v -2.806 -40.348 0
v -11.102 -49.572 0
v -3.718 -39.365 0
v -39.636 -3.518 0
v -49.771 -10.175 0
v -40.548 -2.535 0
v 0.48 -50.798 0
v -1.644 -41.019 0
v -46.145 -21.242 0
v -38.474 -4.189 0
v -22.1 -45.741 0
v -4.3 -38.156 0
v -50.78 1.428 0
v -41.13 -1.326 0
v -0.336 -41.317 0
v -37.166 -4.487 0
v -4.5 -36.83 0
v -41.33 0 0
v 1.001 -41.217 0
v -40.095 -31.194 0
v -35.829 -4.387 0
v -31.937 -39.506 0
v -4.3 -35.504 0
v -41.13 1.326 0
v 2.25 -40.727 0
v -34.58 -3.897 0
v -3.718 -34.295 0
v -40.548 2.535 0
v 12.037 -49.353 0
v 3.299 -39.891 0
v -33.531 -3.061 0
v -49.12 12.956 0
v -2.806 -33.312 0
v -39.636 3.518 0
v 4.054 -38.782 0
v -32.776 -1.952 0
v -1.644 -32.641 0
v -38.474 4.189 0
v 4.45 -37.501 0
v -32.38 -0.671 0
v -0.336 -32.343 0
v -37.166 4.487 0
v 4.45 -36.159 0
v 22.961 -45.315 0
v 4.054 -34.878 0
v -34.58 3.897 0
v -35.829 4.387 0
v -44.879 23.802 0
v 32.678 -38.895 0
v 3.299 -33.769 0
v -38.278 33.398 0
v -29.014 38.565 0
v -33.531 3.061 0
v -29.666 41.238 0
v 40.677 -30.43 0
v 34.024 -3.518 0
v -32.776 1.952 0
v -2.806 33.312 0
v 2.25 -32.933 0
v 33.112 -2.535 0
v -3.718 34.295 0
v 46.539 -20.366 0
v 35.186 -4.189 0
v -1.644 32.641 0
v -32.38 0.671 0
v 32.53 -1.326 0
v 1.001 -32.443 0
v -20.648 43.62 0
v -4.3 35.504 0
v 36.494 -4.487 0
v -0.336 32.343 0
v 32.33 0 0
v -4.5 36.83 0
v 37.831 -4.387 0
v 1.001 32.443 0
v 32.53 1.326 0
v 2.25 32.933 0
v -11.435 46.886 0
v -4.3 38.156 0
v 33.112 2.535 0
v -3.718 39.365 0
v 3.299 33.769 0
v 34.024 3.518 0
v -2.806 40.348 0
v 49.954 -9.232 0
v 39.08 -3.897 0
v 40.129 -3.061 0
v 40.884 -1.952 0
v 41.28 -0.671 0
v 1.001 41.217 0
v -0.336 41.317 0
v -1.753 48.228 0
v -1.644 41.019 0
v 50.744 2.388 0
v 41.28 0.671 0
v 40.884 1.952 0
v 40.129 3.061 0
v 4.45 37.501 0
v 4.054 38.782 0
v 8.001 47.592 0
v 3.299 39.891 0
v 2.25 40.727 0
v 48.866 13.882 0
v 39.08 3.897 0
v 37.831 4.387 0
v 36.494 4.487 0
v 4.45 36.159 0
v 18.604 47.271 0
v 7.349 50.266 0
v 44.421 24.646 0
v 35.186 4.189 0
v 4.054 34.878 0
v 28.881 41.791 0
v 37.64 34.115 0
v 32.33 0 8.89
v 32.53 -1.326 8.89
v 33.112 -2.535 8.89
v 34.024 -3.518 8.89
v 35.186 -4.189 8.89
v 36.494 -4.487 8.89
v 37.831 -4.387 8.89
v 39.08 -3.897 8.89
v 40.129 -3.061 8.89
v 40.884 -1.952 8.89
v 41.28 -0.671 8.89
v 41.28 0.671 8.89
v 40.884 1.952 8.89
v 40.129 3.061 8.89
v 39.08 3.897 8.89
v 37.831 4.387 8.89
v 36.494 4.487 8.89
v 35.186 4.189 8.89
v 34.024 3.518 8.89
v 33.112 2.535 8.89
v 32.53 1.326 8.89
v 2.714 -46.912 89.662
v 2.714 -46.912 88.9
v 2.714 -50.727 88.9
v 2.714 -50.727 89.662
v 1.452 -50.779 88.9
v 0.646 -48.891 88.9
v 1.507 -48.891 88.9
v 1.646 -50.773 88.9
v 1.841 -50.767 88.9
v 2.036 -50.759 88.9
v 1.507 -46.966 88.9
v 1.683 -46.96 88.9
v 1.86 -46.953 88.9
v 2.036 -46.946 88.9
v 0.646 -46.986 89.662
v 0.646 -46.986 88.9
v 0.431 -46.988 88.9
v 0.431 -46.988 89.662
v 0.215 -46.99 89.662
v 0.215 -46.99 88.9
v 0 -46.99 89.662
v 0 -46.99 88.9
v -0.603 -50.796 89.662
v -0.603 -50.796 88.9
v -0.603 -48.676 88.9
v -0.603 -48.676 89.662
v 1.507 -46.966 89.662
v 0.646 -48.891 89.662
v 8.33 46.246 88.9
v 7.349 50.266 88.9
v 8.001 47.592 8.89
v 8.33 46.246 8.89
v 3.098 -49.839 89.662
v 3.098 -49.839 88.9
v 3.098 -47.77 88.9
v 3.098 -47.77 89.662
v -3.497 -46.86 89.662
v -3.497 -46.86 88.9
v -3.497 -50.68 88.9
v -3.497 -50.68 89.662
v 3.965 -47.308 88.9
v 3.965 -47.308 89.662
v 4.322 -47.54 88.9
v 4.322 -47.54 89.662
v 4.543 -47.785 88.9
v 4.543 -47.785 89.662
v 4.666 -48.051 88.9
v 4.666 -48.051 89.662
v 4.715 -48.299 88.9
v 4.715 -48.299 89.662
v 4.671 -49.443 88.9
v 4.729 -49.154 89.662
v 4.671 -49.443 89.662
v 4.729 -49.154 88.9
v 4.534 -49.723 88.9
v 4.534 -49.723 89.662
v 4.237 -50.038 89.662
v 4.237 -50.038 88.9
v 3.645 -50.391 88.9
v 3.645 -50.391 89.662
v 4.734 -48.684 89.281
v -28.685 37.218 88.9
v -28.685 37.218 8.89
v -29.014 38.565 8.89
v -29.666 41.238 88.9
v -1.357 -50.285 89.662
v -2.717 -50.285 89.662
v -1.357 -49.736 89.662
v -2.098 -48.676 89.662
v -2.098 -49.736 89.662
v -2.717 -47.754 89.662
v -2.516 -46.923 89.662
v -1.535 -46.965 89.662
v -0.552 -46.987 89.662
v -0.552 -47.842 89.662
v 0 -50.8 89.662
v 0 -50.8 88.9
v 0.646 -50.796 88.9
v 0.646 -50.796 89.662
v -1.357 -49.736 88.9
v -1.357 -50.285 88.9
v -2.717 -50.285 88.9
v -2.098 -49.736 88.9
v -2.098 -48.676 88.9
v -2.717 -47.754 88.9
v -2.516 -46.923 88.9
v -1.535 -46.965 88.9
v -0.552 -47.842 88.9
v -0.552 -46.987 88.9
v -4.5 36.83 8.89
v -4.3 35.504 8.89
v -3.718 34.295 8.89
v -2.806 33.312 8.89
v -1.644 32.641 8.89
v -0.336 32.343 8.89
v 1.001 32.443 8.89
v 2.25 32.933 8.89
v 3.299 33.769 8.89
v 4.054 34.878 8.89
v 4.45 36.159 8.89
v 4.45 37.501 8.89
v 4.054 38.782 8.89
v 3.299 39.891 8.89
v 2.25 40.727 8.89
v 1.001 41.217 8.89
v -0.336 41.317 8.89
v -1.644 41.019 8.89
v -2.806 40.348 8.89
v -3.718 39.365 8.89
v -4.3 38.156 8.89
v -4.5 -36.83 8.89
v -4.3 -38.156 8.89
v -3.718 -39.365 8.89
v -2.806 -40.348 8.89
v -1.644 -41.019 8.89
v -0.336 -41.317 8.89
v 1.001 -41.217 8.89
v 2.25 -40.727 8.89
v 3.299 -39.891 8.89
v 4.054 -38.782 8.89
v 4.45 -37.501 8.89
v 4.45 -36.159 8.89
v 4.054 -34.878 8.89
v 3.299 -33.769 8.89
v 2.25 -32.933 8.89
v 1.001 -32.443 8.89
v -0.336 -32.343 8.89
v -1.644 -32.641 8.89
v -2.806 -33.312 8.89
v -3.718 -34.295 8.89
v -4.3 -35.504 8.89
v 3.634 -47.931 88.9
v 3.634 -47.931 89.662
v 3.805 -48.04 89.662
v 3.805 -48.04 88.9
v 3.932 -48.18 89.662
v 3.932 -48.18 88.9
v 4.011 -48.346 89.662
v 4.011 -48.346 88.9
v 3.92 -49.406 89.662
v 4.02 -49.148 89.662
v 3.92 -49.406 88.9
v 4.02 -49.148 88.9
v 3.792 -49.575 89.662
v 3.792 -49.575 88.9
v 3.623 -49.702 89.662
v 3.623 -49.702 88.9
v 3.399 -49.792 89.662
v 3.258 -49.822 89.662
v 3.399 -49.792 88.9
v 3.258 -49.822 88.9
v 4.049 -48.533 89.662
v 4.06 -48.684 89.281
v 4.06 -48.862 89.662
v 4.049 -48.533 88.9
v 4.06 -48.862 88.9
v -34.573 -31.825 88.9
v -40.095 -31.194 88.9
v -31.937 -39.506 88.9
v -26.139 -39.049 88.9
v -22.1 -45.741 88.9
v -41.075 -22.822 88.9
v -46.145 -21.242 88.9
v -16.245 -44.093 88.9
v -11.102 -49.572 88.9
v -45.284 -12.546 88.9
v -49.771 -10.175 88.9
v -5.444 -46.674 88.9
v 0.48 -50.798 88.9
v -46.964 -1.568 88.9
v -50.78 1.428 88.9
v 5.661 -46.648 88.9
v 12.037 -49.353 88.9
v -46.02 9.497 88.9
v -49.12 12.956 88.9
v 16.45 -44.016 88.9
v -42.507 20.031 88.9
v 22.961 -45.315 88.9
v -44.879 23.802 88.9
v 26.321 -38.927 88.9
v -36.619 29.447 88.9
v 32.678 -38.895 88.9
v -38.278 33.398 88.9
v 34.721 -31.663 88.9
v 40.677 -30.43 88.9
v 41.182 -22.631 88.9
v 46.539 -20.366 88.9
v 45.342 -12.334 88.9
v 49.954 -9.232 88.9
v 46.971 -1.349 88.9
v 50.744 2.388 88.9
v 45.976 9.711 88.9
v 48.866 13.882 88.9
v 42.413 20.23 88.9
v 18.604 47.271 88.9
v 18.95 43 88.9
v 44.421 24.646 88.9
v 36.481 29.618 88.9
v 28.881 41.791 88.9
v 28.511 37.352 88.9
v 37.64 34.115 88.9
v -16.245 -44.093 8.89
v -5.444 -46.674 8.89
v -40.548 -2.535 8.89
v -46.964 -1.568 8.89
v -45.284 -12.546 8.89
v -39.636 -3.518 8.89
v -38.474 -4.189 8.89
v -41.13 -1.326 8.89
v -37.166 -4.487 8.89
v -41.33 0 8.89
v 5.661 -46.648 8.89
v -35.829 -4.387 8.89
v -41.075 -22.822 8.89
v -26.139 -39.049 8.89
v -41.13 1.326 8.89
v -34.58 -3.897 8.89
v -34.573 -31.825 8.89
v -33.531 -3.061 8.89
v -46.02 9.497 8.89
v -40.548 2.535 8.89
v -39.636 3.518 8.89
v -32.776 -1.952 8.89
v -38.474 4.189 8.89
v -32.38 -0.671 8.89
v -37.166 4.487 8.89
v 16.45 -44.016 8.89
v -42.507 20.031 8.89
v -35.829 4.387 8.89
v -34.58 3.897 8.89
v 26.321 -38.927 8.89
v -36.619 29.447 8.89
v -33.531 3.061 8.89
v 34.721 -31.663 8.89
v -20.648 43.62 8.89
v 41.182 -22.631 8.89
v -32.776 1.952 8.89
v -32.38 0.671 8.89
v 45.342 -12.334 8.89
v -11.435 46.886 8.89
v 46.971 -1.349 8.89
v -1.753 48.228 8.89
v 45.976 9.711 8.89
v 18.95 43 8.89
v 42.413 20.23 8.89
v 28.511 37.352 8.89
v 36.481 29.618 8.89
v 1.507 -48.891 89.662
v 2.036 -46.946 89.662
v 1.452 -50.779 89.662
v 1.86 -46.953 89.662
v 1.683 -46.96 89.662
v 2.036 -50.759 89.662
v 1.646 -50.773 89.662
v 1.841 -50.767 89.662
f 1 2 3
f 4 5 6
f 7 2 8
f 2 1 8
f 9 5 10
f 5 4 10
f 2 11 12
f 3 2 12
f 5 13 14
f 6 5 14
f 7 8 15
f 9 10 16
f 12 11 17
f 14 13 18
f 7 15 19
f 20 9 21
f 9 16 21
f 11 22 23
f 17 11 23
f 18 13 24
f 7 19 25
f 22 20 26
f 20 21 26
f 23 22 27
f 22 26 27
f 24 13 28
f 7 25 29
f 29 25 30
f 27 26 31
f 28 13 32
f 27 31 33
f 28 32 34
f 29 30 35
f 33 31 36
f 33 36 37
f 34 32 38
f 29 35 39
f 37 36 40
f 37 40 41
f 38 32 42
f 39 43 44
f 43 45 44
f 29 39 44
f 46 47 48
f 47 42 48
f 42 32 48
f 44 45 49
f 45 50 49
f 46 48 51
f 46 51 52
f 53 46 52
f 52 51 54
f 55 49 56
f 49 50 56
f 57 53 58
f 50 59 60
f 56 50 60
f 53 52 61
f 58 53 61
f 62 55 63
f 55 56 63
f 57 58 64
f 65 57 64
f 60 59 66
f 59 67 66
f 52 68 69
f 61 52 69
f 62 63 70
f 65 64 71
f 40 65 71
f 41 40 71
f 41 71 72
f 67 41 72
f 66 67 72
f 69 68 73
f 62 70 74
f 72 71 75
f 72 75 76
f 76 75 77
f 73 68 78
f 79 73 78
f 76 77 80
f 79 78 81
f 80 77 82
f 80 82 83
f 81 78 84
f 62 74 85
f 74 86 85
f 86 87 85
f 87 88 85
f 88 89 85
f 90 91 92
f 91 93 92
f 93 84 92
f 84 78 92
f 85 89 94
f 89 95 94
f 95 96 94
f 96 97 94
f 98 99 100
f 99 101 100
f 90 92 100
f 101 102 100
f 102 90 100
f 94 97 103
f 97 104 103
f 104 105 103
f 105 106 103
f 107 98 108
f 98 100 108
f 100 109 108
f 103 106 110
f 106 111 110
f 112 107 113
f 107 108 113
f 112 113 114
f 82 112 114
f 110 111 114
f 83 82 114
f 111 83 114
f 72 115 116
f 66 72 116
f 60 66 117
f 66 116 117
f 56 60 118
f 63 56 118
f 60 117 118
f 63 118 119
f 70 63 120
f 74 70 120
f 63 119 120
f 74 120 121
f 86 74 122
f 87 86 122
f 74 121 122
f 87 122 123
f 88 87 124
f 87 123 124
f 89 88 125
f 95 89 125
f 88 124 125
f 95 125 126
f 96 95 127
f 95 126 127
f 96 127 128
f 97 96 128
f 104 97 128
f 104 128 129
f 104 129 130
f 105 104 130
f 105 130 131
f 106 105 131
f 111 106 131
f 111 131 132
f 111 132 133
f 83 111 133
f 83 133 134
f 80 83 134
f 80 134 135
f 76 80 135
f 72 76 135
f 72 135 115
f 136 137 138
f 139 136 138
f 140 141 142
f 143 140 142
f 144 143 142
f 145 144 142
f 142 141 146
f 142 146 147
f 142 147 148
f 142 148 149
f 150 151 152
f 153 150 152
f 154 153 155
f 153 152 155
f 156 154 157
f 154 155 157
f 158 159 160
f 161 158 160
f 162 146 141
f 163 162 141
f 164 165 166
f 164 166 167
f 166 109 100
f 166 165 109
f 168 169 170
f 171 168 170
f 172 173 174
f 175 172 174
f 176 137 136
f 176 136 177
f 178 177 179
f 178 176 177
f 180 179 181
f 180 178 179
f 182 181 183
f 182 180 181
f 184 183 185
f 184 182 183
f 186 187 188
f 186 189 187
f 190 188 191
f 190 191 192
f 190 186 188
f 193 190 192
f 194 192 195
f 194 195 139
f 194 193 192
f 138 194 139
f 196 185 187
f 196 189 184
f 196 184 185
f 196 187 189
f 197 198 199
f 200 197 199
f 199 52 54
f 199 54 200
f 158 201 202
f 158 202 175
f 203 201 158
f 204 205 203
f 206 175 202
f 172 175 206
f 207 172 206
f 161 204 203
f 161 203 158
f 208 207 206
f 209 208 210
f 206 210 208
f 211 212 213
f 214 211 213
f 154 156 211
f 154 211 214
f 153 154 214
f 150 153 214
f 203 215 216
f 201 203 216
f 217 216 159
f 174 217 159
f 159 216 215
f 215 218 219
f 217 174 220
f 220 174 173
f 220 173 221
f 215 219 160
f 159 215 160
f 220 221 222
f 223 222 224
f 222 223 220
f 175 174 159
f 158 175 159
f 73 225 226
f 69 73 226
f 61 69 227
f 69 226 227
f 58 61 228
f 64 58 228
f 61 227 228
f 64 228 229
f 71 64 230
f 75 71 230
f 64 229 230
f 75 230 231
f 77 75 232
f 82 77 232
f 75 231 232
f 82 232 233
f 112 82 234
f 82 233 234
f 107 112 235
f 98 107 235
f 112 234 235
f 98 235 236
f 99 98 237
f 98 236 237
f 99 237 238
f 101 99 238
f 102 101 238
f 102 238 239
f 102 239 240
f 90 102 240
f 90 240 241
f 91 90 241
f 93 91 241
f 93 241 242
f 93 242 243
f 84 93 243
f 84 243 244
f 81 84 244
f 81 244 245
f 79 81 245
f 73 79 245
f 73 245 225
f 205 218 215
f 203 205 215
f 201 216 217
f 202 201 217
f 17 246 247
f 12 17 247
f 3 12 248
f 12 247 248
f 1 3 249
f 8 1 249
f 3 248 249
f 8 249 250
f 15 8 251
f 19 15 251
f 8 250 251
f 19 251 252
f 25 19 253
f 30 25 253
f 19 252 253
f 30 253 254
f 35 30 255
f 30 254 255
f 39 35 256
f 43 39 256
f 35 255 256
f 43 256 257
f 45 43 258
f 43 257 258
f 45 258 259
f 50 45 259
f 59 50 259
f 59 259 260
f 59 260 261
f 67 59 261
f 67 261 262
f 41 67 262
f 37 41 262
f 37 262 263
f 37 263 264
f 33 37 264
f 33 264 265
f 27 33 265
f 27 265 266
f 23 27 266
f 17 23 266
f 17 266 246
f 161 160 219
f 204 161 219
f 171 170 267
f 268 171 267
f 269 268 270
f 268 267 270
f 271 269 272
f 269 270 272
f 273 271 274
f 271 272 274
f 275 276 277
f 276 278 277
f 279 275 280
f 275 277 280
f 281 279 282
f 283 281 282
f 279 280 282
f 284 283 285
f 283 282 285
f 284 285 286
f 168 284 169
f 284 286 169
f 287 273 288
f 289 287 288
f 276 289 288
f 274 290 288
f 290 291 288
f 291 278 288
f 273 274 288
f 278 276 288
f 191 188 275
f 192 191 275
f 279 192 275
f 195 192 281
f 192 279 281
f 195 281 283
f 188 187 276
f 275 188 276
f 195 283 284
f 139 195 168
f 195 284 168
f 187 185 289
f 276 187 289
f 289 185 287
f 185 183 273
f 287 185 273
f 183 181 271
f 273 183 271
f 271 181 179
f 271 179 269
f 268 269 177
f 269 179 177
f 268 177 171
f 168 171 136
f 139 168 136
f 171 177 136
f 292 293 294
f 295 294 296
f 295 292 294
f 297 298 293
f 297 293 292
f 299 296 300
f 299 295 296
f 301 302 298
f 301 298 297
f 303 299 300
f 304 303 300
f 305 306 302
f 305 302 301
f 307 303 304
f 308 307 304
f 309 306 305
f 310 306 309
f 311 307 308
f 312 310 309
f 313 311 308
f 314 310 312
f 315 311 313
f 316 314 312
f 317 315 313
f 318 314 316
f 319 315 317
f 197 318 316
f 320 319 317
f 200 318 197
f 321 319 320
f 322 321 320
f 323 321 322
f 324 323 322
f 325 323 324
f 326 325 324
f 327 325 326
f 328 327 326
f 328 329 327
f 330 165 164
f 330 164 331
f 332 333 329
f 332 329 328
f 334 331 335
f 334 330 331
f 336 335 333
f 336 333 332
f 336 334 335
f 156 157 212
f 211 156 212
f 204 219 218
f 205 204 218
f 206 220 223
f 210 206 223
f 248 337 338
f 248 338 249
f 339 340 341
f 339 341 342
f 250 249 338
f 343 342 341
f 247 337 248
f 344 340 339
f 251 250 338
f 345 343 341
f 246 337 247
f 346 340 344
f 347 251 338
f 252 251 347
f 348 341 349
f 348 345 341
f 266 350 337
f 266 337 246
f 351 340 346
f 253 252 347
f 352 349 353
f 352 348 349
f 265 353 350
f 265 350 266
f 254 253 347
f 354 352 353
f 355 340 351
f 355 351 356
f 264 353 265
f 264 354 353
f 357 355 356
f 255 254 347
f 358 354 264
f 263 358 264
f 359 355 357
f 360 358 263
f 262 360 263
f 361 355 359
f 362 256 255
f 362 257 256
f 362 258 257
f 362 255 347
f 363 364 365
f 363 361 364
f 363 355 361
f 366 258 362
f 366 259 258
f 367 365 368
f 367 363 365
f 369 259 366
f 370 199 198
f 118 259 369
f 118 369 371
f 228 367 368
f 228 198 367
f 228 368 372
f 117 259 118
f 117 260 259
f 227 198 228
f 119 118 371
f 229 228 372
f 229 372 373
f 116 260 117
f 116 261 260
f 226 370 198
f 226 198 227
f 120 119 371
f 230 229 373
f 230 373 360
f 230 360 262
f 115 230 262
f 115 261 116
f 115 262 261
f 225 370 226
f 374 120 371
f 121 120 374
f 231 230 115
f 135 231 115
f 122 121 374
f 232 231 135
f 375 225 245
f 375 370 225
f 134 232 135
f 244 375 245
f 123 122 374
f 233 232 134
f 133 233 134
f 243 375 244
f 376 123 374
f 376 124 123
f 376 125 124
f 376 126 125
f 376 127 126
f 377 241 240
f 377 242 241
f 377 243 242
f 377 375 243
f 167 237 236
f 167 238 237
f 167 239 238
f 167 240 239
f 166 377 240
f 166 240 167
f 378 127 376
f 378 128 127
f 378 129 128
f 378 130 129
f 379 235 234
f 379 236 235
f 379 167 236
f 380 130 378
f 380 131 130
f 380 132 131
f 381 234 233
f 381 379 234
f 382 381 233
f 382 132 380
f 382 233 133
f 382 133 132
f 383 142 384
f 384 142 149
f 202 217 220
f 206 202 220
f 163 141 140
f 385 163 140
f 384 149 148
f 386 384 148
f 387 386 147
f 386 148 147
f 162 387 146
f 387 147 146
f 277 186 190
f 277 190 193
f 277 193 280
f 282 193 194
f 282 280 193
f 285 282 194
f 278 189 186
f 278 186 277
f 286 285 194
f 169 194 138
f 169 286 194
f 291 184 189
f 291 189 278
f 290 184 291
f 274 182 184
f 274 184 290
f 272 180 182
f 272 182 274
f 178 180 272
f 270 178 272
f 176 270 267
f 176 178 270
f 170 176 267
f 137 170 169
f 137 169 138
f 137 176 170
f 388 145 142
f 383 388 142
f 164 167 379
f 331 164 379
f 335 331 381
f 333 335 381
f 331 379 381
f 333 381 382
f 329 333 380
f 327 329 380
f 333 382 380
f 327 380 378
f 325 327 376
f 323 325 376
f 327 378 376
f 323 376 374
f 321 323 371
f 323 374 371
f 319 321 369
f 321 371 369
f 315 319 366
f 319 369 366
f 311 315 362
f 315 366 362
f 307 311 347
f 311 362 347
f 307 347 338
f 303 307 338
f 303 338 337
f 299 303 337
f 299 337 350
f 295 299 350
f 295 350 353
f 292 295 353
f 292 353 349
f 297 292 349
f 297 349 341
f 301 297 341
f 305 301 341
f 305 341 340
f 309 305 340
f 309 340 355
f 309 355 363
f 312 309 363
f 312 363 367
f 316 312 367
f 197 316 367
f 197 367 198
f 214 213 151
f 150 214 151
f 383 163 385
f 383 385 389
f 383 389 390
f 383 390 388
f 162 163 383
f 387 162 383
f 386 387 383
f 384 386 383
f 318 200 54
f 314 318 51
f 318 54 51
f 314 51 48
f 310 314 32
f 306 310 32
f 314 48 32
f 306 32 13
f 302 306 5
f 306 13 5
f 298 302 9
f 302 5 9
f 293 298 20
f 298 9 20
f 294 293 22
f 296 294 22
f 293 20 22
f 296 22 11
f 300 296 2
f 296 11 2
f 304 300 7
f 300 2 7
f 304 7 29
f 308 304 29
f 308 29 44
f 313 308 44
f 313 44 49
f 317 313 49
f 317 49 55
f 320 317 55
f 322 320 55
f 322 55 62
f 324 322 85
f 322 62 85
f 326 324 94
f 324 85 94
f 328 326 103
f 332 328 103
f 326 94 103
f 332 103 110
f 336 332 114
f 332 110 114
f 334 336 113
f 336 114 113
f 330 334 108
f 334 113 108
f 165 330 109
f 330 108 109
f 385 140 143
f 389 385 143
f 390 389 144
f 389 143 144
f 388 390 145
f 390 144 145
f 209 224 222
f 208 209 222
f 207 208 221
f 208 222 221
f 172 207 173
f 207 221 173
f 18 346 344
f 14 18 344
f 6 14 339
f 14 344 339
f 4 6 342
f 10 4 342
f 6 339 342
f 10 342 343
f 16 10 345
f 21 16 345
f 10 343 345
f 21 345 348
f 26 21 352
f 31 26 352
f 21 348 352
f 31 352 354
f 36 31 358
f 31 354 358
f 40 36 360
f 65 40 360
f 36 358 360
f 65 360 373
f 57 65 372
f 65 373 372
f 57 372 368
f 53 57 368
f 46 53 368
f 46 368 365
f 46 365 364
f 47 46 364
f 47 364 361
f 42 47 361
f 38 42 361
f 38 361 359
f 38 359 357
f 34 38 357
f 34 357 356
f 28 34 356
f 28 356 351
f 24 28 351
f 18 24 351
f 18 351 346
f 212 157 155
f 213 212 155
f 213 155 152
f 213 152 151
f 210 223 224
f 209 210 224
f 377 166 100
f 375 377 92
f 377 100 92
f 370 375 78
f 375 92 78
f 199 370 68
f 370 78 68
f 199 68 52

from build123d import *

# Parameters (mm, degrees)
F1_DEPTH = 88.9
F2_R     = 48.26
F3_DEPTH = 8.89
F5_D     = 9
F7_DEPTH = 0.762


with BuildPart() as f1:
    # F0 (on Top) → F1 (new body)
    with BuildSketch(Plane.XY):
        with BuildLine():
            Line((-28.68547828, 37.218321239), (-29.6658445271, 41.2380609206))
            ThreePointArc((-29.6658445271, 41.2380609206), (12.0367010673, -49.353397324), (7.3492034658, 50.2655867211))
            Line((7.3492034658, 50.2655867211), (8.3295697129, 46.2458470395))
            ThreePointArc((8.3295697129, 46.2458470395), (11.1339484873, -45.6518925247), (-28.68547828, 37.218321239))
        make_face()
    extrude(amount=F1_DEPTH)

    # F2 (on Top) → F3 (join)
    with BuildSketch(Plane.XY):
        Circle(F2_R)
    extrude(amount=F3_DEPTH)

    # F5 (through all)
    with Locations(Plane(origin=(0, 0, 0), x_dir=(1, 0, 0), z_dir=(0, 0, -1))):
        with Locations((0, 36.83), (-36.83, 0), (0, -36.83), (36.83, 0)):
            Hole(F5_D / 2)


with BuildPart() as f7:
    # F6 (on face) → F7 (new body)
    with BuildSketch(Plane.XY.offset(88.9)):
        with BuildLine():
            ThreePointArc((0.6461914164, -46.9855566813), (0.3231033463, -46.9888891572), (0, -46.99))
            Line((0, -46.99), (0, -50.8))
            Line((0, -50.8), (0.6461914164, -50.7958899583))
            Line((0.6461914164, -50.7958899583), (0.6461914164, -48.8907233198))
            Line((0.6461914164, -48.8907233198), (0.6461914164, -46.9855566813))
        make_face()
    extrude(amount=F7_DEPTH)


with BuildPart() as f7b:
    # F6 (on face) → F7, piece 2 (new body)
    with BuildSketch(Plane.XY.offset(88.9)):
        with BuildLine():
            Line((1.5069042188, -46.9658316191), (0.6461914164, -48.8907233198))
            Line((0.6461914164, -48.8907233198), (1.451614004, -50.7792557722))
            ThreePointArc((1.451614004, -50.7792557722), (1.7437320687, -50.7700639991), (2.035792417, -50.7591917709))
            Line((2.035792417, -50.7591917709), (1.5069042188, -48.8907233198))
            Line((1.5069042188, -48.8907233198), (2.035792417, -46.9458800028))
            ThreePointArc((2.035792417, -46.9458800028), (1.7713764083, -46.9566004479), (1.5069042188, -46.9658316191))
        make_face()
    extrude(amount=F7_DEPTH)


with BuildPart() as f7c:
    # F6 (on face) → F7, piece 3 (new body)
    with BuildSketch(Plane.XY.offset(88.9)):
        with BuildLine():
            add(Edge.make_bspline(
                [(2.7142217515, -46.9115454903), (4.7447532395, -47.3297142611), (4.6868859793, -48.6920135127), (4.8192192328, -50.1168521009), (2.7142217515, -50.7274383375)],
                knots=[0, 0, 0, 0, 0.4916609991, 1, 1, 1, 1], degree=3))
            Line((2.7142217515, -46.9115454903), (2.7142217515, -50.7274383375))
        make_face()
        with BuildLine():
            Line((3.098138608, -49.8390160501), (3.098138608, -47.7703511715))
            add(Edge.make_bspline(
                [(3.098138608, -47.7703511715), (3.9159837179, -47.9146763682), (4.1823109655, -48.5740996123), (3.9640921168, -49.7909076512), (3.098138608, -49.8390160501)],
                knots=[0, 0, 0, 0, 0.4844529906, 1, 1, 1, 1], degree=3))
        make_face(mode=Mode.SUBTRACT)
    extrude(amount=F7_DEPTH)


with BuildPart() as f7d:
    # F6 (on face) → F7, piece 4 (new body)
    with BuildSketch(Plane.XY.offset(88.9)):
        with BuildLine():
            Line((-0.5524637425, -47.8416590199), (-0.5524637425, -46.9867522161))
            ThreePointArc((-0.5524637425, -46.9867522161), (-2.0255783554, -46.9463218189), (-3.4967007439, -46.8597181373))
            Line((-3.4967007439, -46.8597181373), (-3.4967007439, -50.6795134537))
            Line((-3.4967007439, -50.6795134537), (-0.6025040187, -50.7964269305))
            Line((-0.6025040187, -50.7964269305), (-0.6025040187, -48.6763324173))
            Line((-0.6025040187, -48.6763324173), (-2.0981333219, -48.6763324173))
            Line((-2.0981333219, -48.6763324173), (-2.0981333219, -49.7363796739))
            Line((-2.0981333219, -49.7363796739), (-1.3566303918, -49.7363796739))
            Line((-1.3566303918, -49.7363796739), (-1.3566303918, -50.2853654972))
            Line((-1.3566303918, -50.2853654972), (-2.7167940665, -50.2853654972))
            Line((-2.7167940665, -50.2853654972), (-2.7167940665, -47.7542291017))
            Line((-2.7167940665, -47.7542291017), (-0.5524637425, -47.8416590199))
        make_face()
    extrude(amount=F7_DEPTH)


solid = Compound([f1.part, f7.part, f7b.part, f7c.part, f7d.part])
